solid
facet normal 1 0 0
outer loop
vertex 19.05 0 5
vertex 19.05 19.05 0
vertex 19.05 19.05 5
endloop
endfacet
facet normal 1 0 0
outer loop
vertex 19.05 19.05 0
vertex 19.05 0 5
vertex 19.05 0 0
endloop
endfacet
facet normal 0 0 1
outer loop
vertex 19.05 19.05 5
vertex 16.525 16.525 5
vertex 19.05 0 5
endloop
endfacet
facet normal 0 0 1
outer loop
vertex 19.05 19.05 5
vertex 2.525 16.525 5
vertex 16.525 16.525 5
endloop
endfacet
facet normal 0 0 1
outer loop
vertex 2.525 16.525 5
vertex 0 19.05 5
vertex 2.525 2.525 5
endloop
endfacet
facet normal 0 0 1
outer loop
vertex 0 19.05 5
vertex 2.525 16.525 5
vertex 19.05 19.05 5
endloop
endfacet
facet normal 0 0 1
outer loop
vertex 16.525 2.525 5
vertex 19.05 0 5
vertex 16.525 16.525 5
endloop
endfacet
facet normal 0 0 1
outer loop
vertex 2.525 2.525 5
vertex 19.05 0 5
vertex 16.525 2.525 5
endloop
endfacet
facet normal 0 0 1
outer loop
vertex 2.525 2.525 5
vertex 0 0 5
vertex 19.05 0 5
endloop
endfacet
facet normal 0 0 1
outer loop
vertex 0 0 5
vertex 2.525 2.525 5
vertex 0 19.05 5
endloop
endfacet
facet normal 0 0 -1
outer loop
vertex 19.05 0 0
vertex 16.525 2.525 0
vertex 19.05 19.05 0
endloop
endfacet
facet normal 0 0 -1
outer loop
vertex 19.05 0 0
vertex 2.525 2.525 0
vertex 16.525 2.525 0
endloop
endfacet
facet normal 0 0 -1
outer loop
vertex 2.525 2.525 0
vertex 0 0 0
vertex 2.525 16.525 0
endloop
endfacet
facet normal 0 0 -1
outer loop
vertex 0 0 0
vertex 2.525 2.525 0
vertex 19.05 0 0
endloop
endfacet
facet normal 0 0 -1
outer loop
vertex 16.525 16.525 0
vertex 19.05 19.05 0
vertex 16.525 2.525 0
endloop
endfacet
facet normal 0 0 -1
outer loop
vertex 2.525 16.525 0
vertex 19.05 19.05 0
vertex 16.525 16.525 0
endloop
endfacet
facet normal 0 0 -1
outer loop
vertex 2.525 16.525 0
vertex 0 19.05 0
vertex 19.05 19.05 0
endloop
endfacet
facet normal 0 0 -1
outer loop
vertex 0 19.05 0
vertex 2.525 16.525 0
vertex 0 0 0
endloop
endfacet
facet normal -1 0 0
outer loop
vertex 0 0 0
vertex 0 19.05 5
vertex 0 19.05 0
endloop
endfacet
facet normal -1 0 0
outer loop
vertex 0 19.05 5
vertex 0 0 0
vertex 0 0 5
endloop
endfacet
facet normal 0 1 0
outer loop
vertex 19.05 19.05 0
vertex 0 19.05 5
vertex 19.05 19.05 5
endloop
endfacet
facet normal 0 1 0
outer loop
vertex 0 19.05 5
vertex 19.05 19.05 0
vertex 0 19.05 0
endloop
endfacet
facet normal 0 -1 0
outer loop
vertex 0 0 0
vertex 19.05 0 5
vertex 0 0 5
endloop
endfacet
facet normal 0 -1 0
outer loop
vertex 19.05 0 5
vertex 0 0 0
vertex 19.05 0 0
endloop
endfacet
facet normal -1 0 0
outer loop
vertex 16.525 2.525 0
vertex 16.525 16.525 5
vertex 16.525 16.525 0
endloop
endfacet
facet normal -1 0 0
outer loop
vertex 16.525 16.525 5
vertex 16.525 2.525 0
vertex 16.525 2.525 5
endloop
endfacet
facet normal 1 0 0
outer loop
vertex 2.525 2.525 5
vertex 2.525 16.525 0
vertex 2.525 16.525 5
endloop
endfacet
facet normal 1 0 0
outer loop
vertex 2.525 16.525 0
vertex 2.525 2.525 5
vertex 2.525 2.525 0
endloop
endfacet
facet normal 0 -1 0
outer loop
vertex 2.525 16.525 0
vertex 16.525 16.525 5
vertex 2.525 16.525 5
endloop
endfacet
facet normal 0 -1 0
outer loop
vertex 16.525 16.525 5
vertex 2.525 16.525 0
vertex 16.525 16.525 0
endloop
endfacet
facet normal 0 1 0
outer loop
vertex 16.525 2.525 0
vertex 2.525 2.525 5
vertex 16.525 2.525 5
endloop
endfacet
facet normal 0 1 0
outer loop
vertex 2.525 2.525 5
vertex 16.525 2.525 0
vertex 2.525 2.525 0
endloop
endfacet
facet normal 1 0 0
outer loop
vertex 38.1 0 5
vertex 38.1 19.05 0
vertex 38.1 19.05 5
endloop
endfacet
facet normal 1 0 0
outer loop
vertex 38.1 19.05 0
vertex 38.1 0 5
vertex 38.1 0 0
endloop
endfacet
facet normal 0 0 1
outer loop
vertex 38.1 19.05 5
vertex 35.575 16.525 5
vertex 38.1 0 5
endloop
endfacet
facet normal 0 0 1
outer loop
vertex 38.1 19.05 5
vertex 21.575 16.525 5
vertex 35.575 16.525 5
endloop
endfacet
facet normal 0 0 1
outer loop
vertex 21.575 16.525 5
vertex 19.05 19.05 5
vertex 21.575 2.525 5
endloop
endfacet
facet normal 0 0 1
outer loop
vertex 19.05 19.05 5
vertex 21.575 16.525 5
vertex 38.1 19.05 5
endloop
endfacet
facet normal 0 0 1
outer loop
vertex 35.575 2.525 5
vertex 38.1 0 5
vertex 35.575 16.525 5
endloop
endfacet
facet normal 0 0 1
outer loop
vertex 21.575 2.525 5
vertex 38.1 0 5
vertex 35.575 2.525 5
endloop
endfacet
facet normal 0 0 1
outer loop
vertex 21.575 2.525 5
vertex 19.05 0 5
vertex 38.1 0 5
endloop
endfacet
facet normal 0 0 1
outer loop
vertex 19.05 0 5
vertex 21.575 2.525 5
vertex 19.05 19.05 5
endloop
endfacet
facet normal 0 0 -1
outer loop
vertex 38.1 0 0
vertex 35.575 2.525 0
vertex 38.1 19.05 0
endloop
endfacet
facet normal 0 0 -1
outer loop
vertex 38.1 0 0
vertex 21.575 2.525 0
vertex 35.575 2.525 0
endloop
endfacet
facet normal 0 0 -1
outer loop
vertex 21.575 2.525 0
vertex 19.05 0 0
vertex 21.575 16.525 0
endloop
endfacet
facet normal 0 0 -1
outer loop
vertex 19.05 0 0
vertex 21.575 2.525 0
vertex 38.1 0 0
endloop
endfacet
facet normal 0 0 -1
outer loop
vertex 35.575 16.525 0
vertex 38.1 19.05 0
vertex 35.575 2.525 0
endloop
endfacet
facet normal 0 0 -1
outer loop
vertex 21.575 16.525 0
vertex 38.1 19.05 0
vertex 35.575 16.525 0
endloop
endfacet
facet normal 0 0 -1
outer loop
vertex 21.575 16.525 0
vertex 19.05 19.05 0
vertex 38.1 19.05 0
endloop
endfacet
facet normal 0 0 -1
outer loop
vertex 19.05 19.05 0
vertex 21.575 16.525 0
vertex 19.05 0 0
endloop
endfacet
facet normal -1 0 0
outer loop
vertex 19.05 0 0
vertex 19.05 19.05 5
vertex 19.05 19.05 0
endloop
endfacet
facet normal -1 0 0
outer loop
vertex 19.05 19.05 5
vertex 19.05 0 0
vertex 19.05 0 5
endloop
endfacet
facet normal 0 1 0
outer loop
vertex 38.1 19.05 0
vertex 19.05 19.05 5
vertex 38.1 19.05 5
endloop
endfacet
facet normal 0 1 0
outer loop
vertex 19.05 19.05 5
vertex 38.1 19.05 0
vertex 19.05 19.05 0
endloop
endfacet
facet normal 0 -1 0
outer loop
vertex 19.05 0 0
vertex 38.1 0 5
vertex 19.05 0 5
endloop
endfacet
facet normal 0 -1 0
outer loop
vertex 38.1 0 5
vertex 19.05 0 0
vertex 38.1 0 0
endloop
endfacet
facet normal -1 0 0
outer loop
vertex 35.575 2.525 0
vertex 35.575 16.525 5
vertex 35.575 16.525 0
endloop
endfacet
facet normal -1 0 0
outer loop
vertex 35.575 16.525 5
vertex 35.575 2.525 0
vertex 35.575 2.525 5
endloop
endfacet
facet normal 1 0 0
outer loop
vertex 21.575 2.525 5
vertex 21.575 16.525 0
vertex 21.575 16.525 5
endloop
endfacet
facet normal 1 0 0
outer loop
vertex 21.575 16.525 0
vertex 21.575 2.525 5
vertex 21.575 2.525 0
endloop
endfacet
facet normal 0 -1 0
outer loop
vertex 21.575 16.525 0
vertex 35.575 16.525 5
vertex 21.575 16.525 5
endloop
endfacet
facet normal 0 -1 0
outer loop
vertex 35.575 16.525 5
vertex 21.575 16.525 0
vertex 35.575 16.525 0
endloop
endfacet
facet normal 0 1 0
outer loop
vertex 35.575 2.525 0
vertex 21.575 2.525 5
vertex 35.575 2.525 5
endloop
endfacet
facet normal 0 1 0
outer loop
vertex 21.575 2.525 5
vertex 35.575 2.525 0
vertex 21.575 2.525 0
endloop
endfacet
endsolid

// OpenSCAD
//import("/home/coni/Downloads/5027bcf069badcbad8a18b8ca4e2a05bd43c9a39_switch.dxf");

keycap_size=18;
switch_hole=14;
key_hole_thickness=5;
keyholder=19.05;
case_height=10;
case_thickness=10;

module key() {
    difference() {
        cube([keyholder, keyholder, key_hole_thickness]);
        translate([(keyholder - switch_hole) / 2, (keyholder - switch_hole) / 2, -1]) {
            cube([switch_hole, switch_hole, key_hole_thickness + 2]);
        };
    };
};


module key_column(x=0, y=0, row=1, column=1) {
    for (i = [0:1:column - 1])
    {
        for (j = [0:1:row - 1])
        {
            translate([x + (i * keyholder), y + (j * keyholder), 0]) key();
        }
    }
   
    //translate([0,0, -10]) cube([(row * keyholder), 1, 10]);
};
color("#ffffff") key_column(row=1, column=2);
